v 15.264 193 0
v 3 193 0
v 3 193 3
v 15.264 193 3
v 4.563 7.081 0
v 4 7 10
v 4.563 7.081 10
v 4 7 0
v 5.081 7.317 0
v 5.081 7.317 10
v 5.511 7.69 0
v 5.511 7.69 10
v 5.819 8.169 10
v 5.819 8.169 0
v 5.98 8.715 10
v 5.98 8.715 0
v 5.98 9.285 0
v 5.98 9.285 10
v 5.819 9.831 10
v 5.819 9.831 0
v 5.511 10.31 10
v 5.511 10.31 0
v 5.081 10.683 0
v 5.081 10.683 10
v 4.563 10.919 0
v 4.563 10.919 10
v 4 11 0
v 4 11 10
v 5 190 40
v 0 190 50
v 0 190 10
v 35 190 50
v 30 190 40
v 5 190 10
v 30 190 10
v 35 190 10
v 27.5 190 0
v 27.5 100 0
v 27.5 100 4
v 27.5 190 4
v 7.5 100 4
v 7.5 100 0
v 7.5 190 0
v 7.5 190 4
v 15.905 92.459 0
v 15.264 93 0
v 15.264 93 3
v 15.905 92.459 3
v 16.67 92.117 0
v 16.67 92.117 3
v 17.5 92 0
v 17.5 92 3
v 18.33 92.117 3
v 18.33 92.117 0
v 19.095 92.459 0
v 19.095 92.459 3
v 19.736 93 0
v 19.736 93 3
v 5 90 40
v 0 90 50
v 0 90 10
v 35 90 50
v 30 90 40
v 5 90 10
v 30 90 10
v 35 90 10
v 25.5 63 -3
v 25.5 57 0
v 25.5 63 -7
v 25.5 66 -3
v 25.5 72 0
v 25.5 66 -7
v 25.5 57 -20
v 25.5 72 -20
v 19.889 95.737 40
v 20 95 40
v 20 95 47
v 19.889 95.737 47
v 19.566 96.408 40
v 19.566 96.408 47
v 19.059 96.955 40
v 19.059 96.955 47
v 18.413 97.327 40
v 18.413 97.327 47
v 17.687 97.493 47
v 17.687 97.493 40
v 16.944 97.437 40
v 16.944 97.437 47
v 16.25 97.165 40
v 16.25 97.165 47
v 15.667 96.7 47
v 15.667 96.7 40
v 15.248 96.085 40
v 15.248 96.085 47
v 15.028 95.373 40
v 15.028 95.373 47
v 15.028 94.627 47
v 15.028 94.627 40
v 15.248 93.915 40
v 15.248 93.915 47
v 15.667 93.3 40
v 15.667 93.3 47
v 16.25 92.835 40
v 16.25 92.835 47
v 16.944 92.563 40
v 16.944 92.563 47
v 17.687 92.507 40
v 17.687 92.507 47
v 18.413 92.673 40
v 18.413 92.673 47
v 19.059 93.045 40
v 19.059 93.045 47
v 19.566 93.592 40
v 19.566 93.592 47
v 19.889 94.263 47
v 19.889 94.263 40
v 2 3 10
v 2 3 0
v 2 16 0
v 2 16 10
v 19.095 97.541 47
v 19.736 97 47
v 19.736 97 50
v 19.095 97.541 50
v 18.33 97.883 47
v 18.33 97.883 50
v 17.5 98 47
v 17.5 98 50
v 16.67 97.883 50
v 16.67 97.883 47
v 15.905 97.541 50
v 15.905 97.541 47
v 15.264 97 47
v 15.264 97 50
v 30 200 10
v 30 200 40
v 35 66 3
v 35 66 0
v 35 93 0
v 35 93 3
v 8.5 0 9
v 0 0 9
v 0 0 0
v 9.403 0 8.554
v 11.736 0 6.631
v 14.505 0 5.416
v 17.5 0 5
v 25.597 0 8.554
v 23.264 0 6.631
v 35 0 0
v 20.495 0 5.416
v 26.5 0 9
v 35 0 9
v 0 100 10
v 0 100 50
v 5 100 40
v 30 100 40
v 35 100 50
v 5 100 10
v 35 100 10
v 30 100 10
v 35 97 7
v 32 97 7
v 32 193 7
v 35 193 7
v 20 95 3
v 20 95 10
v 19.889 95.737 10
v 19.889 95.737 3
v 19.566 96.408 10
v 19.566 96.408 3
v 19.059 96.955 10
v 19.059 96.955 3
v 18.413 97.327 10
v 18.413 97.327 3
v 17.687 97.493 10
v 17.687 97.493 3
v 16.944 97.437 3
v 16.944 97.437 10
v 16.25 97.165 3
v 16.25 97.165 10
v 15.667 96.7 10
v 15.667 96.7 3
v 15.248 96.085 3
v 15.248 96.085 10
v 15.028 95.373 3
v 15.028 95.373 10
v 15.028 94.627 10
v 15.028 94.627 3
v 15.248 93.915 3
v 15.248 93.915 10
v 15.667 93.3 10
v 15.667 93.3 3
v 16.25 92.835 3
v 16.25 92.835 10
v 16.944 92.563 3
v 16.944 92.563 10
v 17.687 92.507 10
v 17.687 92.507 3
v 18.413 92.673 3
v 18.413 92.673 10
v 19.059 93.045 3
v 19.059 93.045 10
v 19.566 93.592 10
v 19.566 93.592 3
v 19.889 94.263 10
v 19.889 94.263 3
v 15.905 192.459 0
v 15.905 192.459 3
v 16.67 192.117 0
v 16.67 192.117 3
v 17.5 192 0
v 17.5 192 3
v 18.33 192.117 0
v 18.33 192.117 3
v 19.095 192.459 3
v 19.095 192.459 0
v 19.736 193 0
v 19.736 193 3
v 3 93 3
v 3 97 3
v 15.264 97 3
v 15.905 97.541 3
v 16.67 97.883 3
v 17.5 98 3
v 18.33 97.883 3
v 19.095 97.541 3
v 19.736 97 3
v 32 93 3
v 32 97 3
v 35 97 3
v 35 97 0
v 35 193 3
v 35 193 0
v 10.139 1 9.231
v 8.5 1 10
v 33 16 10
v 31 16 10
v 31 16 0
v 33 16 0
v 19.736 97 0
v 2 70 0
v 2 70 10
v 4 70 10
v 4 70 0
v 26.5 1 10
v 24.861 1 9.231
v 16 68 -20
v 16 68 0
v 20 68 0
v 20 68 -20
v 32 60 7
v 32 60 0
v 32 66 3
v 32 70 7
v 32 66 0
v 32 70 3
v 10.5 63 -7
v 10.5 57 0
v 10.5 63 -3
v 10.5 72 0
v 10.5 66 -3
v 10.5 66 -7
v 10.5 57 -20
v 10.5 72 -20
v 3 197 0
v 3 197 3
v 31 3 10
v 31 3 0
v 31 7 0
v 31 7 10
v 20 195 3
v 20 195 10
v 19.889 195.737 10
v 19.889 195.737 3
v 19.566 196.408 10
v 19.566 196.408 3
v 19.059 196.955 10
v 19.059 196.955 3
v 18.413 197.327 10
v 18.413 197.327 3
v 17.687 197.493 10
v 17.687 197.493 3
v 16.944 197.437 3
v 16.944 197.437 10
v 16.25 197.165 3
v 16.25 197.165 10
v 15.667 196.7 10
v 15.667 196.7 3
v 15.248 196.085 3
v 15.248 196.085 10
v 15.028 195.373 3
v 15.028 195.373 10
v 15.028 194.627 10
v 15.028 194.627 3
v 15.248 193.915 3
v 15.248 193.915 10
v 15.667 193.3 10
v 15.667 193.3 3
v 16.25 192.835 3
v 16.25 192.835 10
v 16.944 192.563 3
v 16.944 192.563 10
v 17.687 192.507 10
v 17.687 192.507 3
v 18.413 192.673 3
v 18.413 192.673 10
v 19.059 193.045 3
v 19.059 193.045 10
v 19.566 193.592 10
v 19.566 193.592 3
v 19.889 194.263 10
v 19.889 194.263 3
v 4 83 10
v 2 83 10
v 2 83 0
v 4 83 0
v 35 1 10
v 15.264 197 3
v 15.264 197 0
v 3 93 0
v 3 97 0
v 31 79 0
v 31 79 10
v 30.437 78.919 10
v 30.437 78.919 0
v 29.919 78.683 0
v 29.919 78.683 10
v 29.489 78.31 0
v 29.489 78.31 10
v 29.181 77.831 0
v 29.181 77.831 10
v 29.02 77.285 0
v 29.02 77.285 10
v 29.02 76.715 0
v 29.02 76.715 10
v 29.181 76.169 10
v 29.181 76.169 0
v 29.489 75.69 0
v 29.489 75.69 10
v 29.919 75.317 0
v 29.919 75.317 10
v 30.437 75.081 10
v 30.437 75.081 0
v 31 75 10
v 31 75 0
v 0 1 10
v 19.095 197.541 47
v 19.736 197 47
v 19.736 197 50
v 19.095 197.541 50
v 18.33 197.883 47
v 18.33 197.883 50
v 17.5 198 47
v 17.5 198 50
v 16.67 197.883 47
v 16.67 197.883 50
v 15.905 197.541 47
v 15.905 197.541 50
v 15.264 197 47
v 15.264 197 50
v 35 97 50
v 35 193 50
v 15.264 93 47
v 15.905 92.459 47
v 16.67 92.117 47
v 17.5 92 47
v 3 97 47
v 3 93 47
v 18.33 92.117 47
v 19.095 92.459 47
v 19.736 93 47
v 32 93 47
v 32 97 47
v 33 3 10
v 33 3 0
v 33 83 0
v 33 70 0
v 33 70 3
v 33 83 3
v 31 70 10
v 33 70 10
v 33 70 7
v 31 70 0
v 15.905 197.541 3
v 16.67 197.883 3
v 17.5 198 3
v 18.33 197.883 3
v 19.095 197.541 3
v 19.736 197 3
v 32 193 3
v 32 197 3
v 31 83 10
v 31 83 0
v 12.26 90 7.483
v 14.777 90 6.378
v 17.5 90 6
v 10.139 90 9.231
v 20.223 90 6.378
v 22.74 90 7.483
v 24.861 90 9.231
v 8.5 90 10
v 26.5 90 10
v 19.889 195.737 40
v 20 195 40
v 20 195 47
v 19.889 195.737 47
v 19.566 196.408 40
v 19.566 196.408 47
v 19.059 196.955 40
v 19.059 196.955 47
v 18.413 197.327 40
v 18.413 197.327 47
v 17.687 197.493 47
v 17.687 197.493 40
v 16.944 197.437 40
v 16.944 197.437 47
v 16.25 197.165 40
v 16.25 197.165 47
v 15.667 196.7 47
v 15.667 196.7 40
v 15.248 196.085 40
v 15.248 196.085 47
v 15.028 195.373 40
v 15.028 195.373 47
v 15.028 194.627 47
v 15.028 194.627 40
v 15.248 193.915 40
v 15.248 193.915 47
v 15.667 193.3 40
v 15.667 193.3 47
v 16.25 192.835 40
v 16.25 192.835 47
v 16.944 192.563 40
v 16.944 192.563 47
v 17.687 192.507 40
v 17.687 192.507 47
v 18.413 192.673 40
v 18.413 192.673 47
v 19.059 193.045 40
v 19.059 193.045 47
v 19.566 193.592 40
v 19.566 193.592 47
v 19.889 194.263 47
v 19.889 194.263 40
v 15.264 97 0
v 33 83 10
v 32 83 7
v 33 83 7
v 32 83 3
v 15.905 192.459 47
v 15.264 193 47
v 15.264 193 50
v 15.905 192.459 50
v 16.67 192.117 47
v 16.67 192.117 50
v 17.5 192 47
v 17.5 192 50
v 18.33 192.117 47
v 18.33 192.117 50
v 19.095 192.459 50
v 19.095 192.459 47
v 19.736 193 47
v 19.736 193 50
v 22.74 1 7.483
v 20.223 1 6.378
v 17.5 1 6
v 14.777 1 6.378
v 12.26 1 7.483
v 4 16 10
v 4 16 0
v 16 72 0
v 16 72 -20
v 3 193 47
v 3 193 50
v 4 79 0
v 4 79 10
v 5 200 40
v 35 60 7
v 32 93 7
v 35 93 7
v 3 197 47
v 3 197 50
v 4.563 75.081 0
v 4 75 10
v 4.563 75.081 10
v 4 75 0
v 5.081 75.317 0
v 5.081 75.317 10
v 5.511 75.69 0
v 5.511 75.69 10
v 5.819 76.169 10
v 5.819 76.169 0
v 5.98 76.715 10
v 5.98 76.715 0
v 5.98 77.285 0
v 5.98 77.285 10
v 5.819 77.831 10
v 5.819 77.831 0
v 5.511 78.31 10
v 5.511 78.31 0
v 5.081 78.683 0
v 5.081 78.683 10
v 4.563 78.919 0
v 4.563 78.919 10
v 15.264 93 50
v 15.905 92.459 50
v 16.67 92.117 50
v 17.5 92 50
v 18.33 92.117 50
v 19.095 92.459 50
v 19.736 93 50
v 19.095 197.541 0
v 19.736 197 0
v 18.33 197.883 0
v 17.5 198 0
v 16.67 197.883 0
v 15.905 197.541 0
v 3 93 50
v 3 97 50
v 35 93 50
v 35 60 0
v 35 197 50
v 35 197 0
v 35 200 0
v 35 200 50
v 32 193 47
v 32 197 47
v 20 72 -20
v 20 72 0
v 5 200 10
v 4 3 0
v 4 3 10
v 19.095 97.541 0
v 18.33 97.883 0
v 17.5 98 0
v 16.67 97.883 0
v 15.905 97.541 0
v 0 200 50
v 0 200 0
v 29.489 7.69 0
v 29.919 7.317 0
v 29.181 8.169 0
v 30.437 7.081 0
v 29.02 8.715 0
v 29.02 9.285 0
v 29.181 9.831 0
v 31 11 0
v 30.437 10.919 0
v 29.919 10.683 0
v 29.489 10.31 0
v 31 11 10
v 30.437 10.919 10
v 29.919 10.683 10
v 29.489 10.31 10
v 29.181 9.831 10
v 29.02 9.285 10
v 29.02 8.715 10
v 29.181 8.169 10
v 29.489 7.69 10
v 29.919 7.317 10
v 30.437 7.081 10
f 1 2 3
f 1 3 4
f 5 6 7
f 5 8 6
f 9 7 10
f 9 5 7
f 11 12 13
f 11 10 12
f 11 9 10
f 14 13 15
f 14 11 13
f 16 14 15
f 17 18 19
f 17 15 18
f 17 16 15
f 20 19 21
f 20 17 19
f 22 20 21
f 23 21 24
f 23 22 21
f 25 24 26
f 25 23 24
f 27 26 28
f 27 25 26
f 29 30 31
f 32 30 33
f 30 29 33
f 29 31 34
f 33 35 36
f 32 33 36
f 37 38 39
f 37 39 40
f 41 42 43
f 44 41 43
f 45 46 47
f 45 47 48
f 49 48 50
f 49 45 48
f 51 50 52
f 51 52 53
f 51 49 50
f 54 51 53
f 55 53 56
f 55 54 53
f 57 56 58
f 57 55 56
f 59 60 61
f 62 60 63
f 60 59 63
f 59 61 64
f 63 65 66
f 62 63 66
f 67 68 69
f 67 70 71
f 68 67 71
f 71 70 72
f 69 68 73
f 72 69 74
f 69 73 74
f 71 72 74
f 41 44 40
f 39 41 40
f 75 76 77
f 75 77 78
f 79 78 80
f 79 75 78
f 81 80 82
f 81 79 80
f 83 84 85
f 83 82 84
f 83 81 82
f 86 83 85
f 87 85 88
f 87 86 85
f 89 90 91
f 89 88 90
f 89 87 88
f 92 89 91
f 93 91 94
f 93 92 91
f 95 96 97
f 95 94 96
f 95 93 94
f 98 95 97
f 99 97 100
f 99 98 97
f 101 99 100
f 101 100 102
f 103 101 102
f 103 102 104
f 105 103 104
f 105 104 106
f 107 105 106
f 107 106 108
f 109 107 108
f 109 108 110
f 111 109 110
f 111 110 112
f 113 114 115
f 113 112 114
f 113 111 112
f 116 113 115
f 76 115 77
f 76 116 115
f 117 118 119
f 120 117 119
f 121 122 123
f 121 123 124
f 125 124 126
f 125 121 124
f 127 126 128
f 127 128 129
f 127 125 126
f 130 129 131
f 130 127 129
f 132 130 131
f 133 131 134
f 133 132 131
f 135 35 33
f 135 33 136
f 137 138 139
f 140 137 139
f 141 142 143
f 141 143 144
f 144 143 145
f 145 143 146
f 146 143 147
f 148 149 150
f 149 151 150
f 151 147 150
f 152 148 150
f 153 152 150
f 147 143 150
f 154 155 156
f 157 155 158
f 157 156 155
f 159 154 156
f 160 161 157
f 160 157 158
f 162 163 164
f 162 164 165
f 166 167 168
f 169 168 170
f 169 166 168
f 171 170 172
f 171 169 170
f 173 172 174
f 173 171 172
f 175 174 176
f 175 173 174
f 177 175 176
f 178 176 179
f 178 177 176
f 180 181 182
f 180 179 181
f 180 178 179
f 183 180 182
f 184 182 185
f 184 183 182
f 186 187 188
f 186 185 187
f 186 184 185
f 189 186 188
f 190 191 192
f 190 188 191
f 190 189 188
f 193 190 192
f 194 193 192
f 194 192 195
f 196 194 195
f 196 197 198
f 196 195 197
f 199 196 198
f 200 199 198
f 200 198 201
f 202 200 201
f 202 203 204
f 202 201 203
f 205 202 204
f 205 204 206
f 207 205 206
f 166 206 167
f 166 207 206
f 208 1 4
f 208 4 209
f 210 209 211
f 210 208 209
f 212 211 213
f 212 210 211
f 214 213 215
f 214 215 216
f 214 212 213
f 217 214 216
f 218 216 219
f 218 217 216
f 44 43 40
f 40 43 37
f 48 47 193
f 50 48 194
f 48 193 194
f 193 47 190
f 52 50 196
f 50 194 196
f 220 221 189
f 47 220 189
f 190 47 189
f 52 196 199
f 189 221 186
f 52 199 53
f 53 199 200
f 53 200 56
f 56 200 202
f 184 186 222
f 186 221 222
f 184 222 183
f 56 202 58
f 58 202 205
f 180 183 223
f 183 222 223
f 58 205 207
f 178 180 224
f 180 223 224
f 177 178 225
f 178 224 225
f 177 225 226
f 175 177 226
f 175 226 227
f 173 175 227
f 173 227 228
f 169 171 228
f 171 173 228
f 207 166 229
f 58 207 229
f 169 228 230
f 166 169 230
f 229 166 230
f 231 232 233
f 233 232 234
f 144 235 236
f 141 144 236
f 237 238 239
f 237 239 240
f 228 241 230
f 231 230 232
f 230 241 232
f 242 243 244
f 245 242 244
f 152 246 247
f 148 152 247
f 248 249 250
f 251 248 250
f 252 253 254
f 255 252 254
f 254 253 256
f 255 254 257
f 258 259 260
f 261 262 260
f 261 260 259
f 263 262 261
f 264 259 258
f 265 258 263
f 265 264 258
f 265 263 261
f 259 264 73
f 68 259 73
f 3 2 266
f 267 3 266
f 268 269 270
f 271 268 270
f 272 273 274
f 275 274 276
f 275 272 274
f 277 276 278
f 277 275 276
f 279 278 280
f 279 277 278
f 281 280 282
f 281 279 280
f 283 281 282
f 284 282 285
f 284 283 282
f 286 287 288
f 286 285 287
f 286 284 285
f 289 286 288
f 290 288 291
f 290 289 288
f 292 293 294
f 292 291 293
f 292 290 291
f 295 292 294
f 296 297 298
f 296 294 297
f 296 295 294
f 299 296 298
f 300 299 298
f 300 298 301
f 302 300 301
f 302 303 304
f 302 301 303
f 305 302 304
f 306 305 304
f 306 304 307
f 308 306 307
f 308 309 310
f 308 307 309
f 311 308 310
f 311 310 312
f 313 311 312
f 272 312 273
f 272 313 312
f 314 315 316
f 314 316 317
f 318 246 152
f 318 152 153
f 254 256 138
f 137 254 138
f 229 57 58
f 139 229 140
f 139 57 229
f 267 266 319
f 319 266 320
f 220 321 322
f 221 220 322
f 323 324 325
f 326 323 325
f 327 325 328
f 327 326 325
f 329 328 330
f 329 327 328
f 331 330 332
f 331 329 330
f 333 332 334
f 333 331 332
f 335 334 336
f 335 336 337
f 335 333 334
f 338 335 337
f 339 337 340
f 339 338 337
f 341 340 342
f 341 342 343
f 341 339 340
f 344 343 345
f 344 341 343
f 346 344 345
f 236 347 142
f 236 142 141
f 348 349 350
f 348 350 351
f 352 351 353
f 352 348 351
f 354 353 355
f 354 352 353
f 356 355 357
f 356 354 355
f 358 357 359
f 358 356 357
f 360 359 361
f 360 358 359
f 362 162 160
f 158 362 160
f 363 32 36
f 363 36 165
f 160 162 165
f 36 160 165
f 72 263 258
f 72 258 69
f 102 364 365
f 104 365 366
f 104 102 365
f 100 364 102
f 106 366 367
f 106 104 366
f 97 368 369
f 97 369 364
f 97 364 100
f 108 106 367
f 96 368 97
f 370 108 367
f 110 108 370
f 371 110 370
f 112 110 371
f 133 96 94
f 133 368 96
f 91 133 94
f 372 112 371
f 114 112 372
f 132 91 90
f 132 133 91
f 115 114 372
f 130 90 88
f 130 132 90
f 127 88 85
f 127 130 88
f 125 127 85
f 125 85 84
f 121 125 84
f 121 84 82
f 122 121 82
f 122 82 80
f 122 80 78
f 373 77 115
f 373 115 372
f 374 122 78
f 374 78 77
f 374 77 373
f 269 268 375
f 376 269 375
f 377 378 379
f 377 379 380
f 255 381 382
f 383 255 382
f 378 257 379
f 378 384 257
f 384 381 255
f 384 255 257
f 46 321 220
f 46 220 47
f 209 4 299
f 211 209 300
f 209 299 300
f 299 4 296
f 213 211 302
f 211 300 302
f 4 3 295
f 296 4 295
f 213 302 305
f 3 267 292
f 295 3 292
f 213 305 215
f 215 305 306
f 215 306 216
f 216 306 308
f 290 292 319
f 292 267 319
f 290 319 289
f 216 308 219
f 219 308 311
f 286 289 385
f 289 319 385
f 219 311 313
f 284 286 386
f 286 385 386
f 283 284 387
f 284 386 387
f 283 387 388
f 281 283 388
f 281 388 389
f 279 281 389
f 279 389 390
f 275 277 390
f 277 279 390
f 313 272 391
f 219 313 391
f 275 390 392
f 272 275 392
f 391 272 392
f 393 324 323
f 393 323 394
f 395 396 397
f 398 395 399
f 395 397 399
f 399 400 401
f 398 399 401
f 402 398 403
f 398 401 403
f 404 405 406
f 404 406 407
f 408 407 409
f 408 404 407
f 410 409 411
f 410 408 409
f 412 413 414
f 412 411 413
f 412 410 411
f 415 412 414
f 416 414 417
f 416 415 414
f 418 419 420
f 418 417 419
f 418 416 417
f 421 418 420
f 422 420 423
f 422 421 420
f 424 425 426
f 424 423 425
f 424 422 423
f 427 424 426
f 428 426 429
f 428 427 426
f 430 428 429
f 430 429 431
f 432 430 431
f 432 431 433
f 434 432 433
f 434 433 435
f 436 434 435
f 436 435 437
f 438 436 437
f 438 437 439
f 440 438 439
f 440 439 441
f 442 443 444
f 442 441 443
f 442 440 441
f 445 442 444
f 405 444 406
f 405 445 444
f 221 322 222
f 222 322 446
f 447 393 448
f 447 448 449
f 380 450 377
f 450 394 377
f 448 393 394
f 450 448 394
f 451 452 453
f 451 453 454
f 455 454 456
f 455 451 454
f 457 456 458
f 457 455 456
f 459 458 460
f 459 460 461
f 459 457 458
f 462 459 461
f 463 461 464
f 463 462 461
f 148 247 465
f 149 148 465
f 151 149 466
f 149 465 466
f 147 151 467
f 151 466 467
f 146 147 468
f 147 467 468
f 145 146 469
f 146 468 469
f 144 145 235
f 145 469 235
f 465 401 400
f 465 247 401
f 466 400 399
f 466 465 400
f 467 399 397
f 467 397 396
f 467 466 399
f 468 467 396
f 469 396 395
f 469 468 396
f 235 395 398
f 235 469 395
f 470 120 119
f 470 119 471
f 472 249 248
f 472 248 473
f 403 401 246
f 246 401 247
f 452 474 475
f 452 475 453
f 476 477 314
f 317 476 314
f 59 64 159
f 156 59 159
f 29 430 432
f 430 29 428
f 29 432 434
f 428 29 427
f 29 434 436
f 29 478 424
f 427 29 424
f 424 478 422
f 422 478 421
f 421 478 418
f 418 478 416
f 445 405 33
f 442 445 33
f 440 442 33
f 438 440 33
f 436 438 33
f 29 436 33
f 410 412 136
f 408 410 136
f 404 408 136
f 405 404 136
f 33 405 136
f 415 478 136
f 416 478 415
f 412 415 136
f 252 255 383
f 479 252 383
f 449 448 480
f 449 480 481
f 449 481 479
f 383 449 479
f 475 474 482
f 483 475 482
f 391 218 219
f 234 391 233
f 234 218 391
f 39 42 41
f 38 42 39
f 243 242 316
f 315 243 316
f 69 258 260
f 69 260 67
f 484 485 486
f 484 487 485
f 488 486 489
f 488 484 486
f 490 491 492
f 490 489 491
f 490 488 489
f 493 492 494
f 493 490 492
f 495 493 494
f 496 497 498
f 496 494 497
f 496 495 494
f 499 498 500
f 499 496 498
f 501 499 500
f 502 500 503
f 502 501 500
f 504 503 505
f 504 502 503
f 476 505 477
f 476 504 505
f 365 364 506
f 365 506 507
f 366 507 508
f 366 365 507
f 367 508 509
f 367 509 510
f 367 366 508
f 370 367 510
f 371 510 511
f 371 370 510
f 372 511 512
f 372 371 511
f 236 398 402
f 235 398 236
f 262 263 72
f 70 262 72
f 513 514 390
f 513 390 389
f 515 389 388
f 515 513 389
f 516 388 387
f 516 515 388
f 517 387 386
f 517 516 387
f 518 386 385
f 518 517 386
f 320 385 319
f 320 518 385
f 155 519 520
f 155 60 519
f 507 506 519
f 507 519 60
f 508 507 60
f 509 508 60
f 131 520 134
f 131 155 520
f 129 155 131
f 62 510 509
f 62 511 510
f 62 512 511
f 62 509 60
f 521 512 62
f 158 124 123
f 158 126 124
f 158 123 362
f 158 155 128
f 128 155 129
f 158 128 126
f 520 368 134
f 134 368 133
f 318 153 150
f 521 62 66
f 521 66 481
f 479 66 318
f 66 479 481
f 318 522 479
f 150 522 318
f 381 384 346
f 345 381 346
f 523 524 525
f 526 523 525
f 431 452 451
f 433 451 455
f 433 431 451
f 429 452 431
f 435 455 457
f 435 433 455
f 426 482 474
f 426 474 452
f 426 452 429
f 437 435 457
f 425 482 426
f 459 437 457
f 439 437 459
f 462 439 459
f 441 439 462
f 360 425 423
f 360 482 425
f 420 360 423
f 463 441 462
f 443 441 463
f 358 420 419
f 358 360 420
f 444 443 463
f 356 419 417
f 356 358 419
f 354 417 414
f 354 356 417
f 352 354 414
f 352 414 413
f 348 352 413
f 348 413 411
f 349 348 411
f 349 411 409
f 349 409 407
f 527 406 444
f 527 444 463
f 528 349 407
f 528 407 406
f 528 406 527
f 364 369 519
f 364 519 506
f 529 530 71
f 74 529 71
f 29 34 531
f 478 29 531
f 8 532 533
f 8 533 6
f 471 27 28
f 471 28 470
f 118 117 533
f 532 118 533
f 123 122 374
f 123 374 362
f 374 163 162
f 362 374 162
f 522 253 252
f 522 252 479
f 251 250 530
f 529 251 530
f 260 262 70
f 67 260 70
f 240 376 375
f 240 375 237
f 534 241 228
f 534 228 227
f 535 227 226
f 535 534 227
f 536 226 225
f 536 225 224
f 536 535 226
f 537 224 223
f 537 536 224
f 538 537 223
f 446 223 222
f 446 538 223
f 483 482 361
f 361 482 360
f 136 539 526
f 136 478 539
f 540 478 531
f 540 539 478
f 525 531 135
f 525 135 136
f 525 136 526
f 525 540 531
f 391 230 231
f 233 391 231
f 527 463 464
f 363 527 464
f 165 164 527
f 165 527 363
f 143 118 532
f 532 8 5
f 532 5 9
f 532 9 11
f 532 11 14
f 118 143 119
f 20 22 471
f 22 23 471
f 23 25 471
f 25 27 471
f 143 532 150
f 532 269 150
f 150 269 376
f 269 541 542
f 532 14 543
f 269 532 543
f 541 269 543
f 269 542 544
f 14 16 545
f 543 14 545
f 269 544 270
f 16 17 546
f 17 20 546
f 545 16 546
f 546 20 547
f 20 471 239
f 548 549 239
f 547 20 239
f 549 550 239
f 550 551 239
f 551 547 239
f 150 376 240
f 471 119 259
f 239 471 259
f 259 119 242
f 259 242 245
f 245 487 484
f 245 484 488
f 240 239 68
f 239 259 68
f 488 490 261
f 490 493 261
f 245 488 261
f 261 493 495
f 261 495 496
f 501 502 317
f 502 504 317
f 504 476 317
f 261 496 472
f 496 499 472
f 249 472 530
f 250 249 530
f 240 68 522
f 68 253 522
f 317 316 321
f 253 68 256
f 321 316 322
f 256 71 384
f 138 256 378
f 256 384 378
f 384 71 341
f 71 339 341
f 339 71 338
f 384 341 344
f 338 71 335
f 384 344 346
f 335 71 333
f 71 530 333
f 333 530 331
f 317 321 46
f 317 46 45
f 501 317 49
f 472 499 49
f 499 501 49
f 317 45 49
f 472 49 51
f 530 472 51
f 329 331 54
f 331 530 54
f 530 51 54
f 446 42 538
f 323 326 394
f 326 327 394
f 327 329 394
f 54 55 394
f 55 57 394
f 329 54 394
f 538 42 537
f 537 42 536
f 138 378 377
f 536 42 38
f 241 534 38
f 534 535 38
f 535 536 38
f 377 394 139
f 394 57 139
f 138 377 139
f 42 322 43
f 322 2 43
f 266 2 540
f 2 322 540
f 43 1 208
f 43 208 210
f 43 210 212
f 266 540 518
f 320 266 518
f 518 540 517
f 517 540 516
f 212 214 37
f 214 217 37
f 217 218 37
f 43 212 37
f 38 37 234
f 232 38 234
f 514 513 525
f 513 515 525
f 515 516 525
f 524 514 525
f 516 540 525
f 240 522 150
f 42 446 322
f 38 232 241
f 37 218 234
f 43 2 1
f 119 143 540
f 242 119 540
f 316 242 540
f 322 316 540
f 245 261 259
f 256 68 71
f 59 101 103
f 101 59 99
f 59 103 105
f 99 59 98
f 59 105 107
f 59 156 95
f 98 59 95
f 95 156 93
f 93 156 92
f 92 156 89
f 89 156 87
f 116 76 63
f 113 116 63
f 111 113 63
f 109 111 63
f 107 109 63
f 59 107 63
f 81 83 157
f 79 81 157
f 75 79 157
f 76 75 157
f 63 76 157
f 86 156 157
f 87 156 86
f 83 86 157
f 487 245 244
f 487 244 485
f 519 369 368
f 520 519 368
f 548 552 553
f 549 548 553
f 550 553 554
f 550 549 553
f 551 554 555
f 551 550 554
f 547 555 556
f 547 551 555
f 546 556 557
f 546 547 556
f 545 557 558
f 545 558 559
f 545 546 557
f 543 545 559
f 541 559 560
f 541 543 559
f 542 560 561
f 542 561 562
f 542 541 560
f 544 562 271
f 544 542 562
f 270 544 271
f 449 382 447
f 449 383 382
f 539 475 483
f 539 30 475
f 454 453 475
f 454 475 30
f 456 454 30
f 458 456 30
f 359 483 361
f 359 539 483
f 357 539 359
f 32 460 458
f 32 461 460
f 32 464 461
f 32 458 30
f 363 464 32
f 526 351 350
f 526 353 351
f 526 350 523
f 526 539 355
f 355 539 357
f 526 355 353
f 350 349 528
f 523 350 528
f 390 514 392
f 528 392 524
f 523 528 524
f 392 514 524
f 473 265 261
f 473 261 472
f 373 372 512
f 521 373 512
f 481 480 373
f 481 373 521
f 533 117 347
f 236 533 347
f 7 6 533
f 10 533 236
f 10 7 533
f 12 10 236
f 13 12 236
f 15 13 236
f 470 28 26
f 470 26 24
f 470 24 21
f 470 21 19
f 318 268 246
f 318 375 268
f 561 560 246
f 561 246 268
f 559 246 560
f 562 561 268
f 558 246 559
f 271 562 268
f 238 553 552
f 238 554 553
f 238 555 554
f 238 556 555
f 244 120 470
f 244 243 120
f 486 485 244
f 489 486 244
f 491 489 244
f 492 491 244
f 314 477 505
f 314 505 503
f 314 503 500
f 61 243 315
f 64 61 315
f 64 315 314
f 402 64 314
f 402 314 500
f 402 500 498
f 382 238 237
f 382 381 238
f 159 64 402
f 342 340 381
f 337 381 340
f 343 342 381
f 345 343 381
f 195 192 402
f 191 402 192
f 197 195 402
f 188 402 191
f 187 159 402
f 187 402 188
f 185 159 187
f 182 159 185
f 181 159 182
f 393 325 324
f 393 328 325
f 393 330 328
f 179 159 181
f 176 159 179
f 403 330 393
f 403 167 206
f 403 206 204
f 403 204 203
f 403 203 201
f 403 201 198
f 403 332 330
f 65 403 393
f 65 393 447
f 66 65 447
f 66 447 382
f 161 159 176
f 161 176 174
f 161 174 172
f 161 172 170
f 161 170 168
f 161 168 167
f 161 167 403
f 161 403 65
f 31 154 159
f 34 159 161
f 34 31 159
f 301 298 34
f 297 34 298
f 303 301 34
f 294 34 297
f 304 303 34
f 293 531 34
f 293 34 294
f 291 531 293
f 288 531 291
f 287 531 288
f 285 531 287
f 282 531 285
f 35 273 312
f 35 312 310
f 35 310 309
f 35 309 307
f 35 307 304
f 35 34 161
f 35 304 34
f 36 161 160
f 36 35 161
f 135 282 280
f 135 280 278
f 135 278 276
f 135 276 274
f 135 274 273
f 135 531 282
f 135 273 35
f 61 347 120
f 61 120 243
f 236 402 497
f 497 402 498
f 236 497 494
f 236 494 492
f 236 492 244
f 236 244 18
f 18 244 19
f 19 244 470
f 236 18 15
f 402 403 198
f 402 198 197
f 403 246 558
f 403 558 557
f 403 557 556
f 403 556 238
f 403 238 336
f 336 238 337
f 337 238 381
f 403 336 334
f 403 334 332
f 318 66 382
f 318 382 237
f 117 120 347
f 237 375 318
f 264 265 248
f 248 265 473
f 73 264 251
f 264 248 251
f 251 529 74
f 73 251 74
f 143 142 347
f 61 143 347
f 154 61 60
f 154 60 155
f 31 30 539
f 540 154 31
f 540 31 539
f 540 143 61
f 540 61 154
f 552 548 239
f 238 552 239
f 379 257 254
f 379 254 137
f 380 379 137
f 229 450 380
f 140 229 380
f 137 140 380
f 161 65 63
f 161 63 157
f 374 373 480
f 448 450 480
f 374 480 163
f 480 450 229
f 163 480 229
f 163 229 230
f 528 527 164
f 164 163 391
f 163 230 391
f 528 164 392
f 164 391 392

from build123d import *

# Parameters (mm, degrees)
CYLINDER005_R     = 3
CYLINDER005_DEPTH = 3
CYLINDER006_R     = 3
CYLINDER006_DEPTH = 3
CYLINDER002_R     = 2.5
CYLINDER002_DEPTH = 60
BOX010_W          = 30
BOX010_H          = 4
BOX010_DEPTH      = 3
BOX008_W          = 30
BOX008_H          = 4
BOX008_DEPTH      = 3
BOX006_W          = 3
BOX006_H          = 4
BOX006_DEPTH      = 50
BOX004_W          = 3
BOX004_H          = 136
BOX004_DEPTH      = 4
BOX003_W          = 25
BOX003_H          = 220
BOX003_DEPTH      = 30
BOX002_W          = 35
BOX002_H          = 10
BOX002_DEPTH      = 50
BOX021_W          = 3
BOX021_H          = 6
BOX021_DEPTH      = 4
BOX018_W          = 20
BOX018_H          = 90
BOX018_DEPTH      = 4
CYLINDER008_R     = 2
CYLINDER008_DEPTH = 10
CYLINDER009_R     = 2
CYLINDER009_DEPTH = 10
CYLINDER010_R     = 2
CYLINDER010_DEPTH = 10
CYLINDER007_R     = 2
CYLINDER007_DEPTH = 10
BOX015_W          = 2
BOX015_H          = 13
BOX015_DEPTH      = 10
BOX016_W          = 2
BOX016_H          = 13
BOX016_DEPTH      = 10
BOX017_W          = 2
BOX017_H          = 13
BOX017_DEPTH      = 10
BOX014_W          = 2
BOX014_H          = 13
BOX014_DEPTH      = 10
CYLINDER003_R     = 3
CYLINDER003_DEPTH = 3
CYLINDER001_R     = 2.5
CYLINDER001_DEPTH = 60
BOX007_W          = 30
BOX007_H          = 4
BOX007_DEPTH      = 3
BOX005_W          = 3
BOX005_H          = 4
BOX005_DEPTH      = 50
CYLINDER_R        = 10
CYLINDER_DEPTH    = 90
BOX_W             = 35
BOX_H             = 200
BOX_DEPTH         = 10
CHAMFER_SIZE      = 1
BOX023_W          = 4
BOX023_H          = 4
BOX023_DEPTH      = 20
BOX022_W          = 20
BOX022_H          = 3
BOX022_DEPTH      = 4
BOX019_W          = 15
BOX019_H          = 15
BOX019_DEPTH      = 20
CYLINDER004_R     = 3
CYLINDER004_DEPTH = 3
BOX009_W          = 30
BOX009_H          = 4
BOX009_DEPTH      = 3
BOX001_W          = 35
BOX001_H          = 10
BOX001_DEPTH      = 50


with BuildPart() as cilindro005:
    # Cylinder005 → Cylinder005 (new body)
    with BuildSketch(Plane(origin=(17.5, 195, 0), x_dir=(1, 0, 0), z_dir=(0, 0, 1))):
        Circle(CYLINDER005_R)
    extrude(amount=CYLINDER005_DEPTH)


with BuildPart() as cilindro006:
    # Cylinder006 → Cylinder006 (new body)
    with BuildSketch(Plane(origin=(17.5, 195, 47), x_dir=(1, 0, 0), z_dir=(0, 0, 1))):
        Circle(CYLINDER006_R)
    extrude(amount=CYLINDER006_DEPTH)


with BuildPart() as cilindro002:
    # Cylinder002 → Cylinder002 (new body)
    with BuildSketch(Plane(origin=(17.5, 195, -1), x_dir=(1, 0, 0), z_dir=(0, 0, 1))):
        Circle(CYLINDER002_R)
    extrude(amount=CYLINDER002_DEPTH)


with BuildPart() as cubo010:
    # Box010 → Box010 (new body)
    with BuildSketch(Plane(origin=(3, 193, 47), x_dir=(1, 0, 0), z_dir=(0, 0, 1))):
        with Locations((15, 2)):
            Rectangle(BOX010_W, BOX010_H)
    extrude(amount=BOX010_DEPTH)


with BuildPart() as cubo008:
    # Box008 → Box008 (new body)
    with BuildSketch(Plane(origin=(3, 193, 0), x_dir=(1, 0, 0), z_dir=(0, 0, 1))):
        with Locations((15, 2)):
            Rectangle(BOX008_W, BOX008_H)
    extrude(amount=BOX008_DEPTH)


with BuildPart() as cubo006:
    # Box006 → Box006 (new body)
    with BuildSketch(Plane(origin=(32, 193, 0), x_dir=(1, 0, 0), z_dir=(0, 0, 1))):
        with Locations((1.5, 2)):
            Rectangle(BOX006_W, BOX006_H)
    extrude(amount=BOX006_DEPTH)


with BuildPart() as cubo004:
    # Box004 → Box004 (new body)
    with BuildSketch(Plane(origin=(32, 60, 3), x_dir=(1, 0, 0), z_dir=(0, 0, 1))):
        with Locations((1.5, 68)):
            Rectangle(BOX004_W, BOX004_H)
    extrude(amount=BOX004_DEPTH)


with BuildPart() as cubo003:
    # Box003 → Box003 (new body)
    with BuildSketch(Plane(origin=(5, 0, 10), x_dir=(1, 0, 0), z_dir=(0, 0, 1))):
        with Locations((12.5, 110)):
            Rectangle(BOX003_W, BOX003_H)
    extrude(amount=BOX003_DEPTH)


with BuildPart() as cut023:
    # Box002 → Box002 (new body)
    with BuildSketch(Plane(origin=(0, 190, 0), x_dir=(1, 0, 0), z_dir=(0, 0, 1))):
        with Locations((17.5, 5)):
            Rectangle(BOX002_W, BOX002_H)
    extrude(amount=BOX002_DEPTH)

    # Cut002: cut Cubo003
    add(cubo003.part, mode=Mode.SUBTRACT)

    # Cut005: cut Cubo004
    add(cubo004.part, mode=Mode.SUBTRACT)

    # Cut007: cut Cubo006
    add(cubo006.part, mode=Mode.SUBTRACT)

    # Cut011: cut Cubo008
    add(cubo008.part, mode=Mode.SUBTRACT)

    # Cut015: cut Cubo010
    add(cubo010.part, mode=Mode.SUBTRACT)

    # Cut017: cut Cilindro002
    add(cilindro002.part, mode=Mode.SUBTRACT)

    # Cut021: cut Cilindro006
    add(cilindro006.part, mode=Mode.SUBTRACT)

    # Cut023: cut Cilindro005
    add(cilindro005.part, mode=Mode.SUBTRACT)


with BuildPart() as cubo021:
    # Box021 → Box021 (new body)
    with BuildSketch(Plane(origin=(32, 60, 0), x_dir=(1, 0, 0), z_dir=(0, 0, 1))):
        with Locations((1.5, 3)):
            Rectangle(BOX021_W, BOX021_H)
    extrude(amount=BOX021_DEPTH)


with BuildPart() as cubo018:
    # Box018 → Box018 (new body)
    with BuildSketch(Plane(origin=(7.5, 100, 0), x_dir=(1, 0, 0), z_dir=(0, 0, 1))):
        with Locations((10, 45)):
            Rectangle(BOX018_W, BOX018_H)
    extrude(amount=BOX018_DEPTH)


with BuildPart() as cilindro008:
    # Cylinder008 → Cylinder008 (new body)
    with BuildSketch(Plane(origin=(31, 9, 0), x_dir=(1, 0, 0), z_dir=(0, 0, 1))):
        Circle(CYLINDER008_R)
    extrude(amount=CYLINDER008_DEPTH)


with BuildPart() as cilindro009:
    # Cylinder009 → Cylinder009 (new body)
    with BuildSketch(Plane(origin=(31, 77, 0), x_dir=(1, 0, 0), z_dir=(0, 0, 1))):
        Circle(CYLINDER009_R)
    extrude(amount=CYLINDER009_DEPTH)


with BuildPart() as cilindro010:
    # Cylinder010 → Cylinder010 (new body)
    with BuildSketch(Plane(origin=(4, 77, 0), x_dir=(1, 0, 0), z_dir=(0, 0, 1))):
        Circle(CYLINDER010_R)
    extrude(amount=CYLINDER010_DEPTH)


with BuildPart() as cilindro007:
    # Cylinder007 → Cylinder007 (new body)
    with BuildSketch(Plane(origin=(4, 9, 0), x_dir=(1, 0, 0), z_dir=(0, 0, 1))):
        Circle(CYLINDER007_R)
    extrude(amount=CYLINDER007_DEPTH)


with BuildPart() as cubo015:
    # Box015 → Box015 (new body)
    with BuildSketch(Plane(origin=(31, 3, 0), x_dir=(1, 0, 0), z_dir=(0, 0, 1))):
        with Locations((1, 6.5)):
            Rectangle(BOX015_W, BOX015_H)
    extrude(amount=BOX015_DEPTH)


with BuildPart() as cubo016:
    # Box016 → Box016 (new body)
    with BuildSketch(Plane(origin=(2, 70, 0), x_dir=(1, 0, 0), z_dir=(0, 0, 1))):
        with Locations((1, 6.5)):
            Rectangle(BOX016_W, BOX016_H)
    extrude(amount=BOX016_DEPTH)


with BuildPart() as cubo017:
    # Box017 → Box017 (new body)
    with BuildSketch(Plane(origin=(31, 70, 0), x_dir=(1, 0, 0), z_dir=(0, 0, 1))):
        with Locations((1, 6.5)):
            Rectangle(BOX017_W, BOX017_H)
    extrude(amount=BOX017_DEPTH)


with BuildPart() as cubo014:
    # Box014 → Box014 (new body)
    with BuildSketch(Plane(origin=(2, 3, 0), x_dir=(1, 0, 0), z_dir=(0, 0, 1))):
        with Locations((1, 6.5)):
            Rectangle(BOX014_W, BOX014_H)
    extrude(amount=BOX014_DEPTH)


with BuildPart() as cilindro003:
    # Cylinder003 → Cylinder003 (new body)
    with BuildSketch(Plane(origin=(17.5, 95, 0), x_dir=(1, 0, 0), z_dir=(0, 0, 1))):
        Circle(CYLINDER003_R)
    extrude(amount=CYLINDER003_DEPTH)


with BuildPart() as cilindro001:
    # Cylinder001 → Cylinder001 (new body)
    with BuildSketch(Plane(origin=(17.5, 95, -1), x_dir=(1, 0, 0), z_dir=(0, 0, 1))):
        Circle(CYLINDER001_R)
    extrude(amount=CYLINDER001_DEPTH)


with BuildPart() as cubo007:
    # Box007 → Box007 (new body)
    with BuildSketch(Plane(origin=(3, 93, 0), x_dir=(1, 0, 0), z_dir=(0, 0, 1))):
        with Locations((15, 2)):
            Rectangle(BOX007_W, BOX007_H)
    extrude(amount=BOX007_DEPTH)


with BuildPart() as cubo005:
    # Box005 → Box005 (new body)
    with BuildSketch(Plane(origin=(32, 93, 0), x_dir=(1, 0, 0), z_dir=(0, 0, 1))):
        with Locations((1.5, 2)):
            Rectangle(BOX005_W, BOX005_H)
    extrude(amount=BOX005_DEPTH)


with BuildPart() as cilindro:
    # Cylinder → Cylinder (new body)
    with BuildSketch(Plane(origin=(17.5, 0, 16), x_dir=(1, 0, 0), z_dir=(0, 1, 0))):
        Circle(CYLINDER_R)
    extrude(amount=CYLINDER_DEPTH)


with BuildPart() as cut037:
    # Box → Box (new body)
    with BuildSketch(Plane.XY):
        with Locations((17.5, 100)):
            Rectangle(BOX_W, BOX_H)
    extrude(amount=BOX_DEPTH)

    # Cut: cut Cilindro
    add(cilindro.part, mode=Mode.SUBTRACT)

    # Chamfer
    chamfer_edges = [cut037.edges().sort_by_distance(p)[0] for p in [
        (30.25, 0, 10),
        (17.5, 0, 6),
        (4.75, 0, 10),
        (25.5, 45, 10),
        (9.5, 45, 10),
    ]]
    chamfer(chamfer_edges, length=CHAMFER_SIZE)

    # Cut003: cut Cubo004
    add(cubo004.part, mode=Mode.SUBTRACT)

    # Cut008: cut Cubo005
    add(cubo005.part, mode=Mode.SUBTRACT)

    # Cut009: cut Cubo006
    add(cubo006.part, mode=Mode.SUBTRACT)

    # Cut012: cut Cubo007
    add(cubo007.part, mode=Mode.SUBTRACT)

    # Cut013: cut Cubo008
    add(cubo008.part, mode=Mode.SUBTRACT)

    # Cut018: cut Cilindro001
    add(cilindro001.part, mode=Mode.SUBTRACT)

    # Cut019: cut Cilindro002
    add(cilindro002.part, mode=Mode.SUBTRACT)

    # Cut024: cut Cilindro003
    add(cilindro003.part, mode=Mode.SUBTRACT)

    # Cut025: cut Cilindro005
    add(cilindro005.part, mode=Mode.SUBTRACT)

    # Cut028: cut Cubo014
    add(cubo014.part, mode=Mode.SUBTRACT)

    # Cut029: cut Cubo017
    add(cubo017.part, mode=Mode.SUBTRACT)

    # Cut030: cut Cubo016
    add(cubo016.part, mode=Mode.SUBTRACT)

    # Cut031: cut Cubo015
    add(cubo015.part, mode=Mode.SUBTRACT)

    # Cut032: cut Cilindro007
    add(cilindro007.part, mode=Mode.SUBTRACT)

    # Cut033: cut Cilindro010
    add(cilindro010.part, mode=Mode.SUBTRACT)

    # Cut034: cut Cilindro009
    add(cilindro009.part, mode=Mode.SUBTRACT)

    # Cut035: cut Cilindro008
    add(cilindro008.part, mode=Mode.SUBTRACT)

    # Cut036: cut Cubo018
    add(cubo018.part, mode=Mode.SUBTRACT)

    # Cut037: cut Cubo021
    add(cubo021.part, mode=Mode.SUBTRACT)


with BuildPart() as cubo023:
    # Box023 → Box023 (new body)
    with BuildSketch(Plane(origin=(16, 61, -20), x_dir=(1, 0, 0), z_dir=(0, 0, 1))):
        with Locations((2, 2)):
            Rectangle(BOX023_W, BOX023_H)
    extrude(amount=BOX023_DEPTH)


with BuildPart() as cubo022:
    # Box022 → Box022 (new body)
    with BuildSketch(Plane(origin=(8, 56, -7), x_dir=(1, 0, 0), z_dir=(0, 0, 1))):
        with Locations((10, 1.5)):
            Rectangle(BOX022_W, BOX022_H)
    extrude(amount=BOX022_DEPTH)


with BuildPart() as cut039:
    # Box019 → Box019 (new body)
    with BuildSketch(Plane(origin=(10.5, 50, -20), x_dir=(1, 0, 0), z_dir=(0, 0, 1))):
        with Locations((7.5, 7.5)):
            Rectangle(BOX019_W, BOX019_H)
    extrude(amount=BOX019_DEPTH)

    # Cut038: cut Cubo022
    add(cubo022.part, mode=Mode.SUBTRACT)

    # Cut039: cut Cubo023
    add(cubo023.part, mode=Mode.SUBTRACT)


with BuildPart() as cut039_1:
    # Cut039 placement: moved
    add(cut039.part.moved(Location((0, 7, 0))))


with BuildPart() as cilindro004:
    # Cylinder004 → Cylinder004 (new body)
    with BuildSketch(Plane(origin=(17.5, 95, 47), x_dir=(1, 0, 0), z_dir=(0, 0, 1))):
        Circle(CYLINDER004_R)
    extrude(amount=CYLINDER004_DEPTH)


with BuildPart() as cubo009:
    # Box009 → Box009 (new body)
    with BuildSketch(Plane(origin=(3, 93, 47), x_dir=(1, 0, 0), z_dir=(0, 0, 1))):
        with Locations((15, 2)):
            Rectangle(BOX009_W, BOX009_H)
    extrude(amount=BOX009_DEPTH)


with BuildPart() as fusion:
    # Box001 → Box001 (new body)
    with BuildSketch(Plane(origin=(0, 90, 0), x_dir=(1, 0, 0), z_dir=(0, 0, 1))):
        with Locations((17.5, 5)):
            Rectangle(BOX001_W, BOX001_H)
    extrude(amount=BOX001_DEPTH)

    # Cut001: cut Cubo003
    add(cubo003.part, mode=Mode.SUBTRACT)

    # Cut004: cut Cubo004
    add(cubo004.part, mode=Mode.SUBTRACT)

    # Cut006: cut Cubo005
    add(cubo005.part, mode=Mode.SUBTRACT)

    # Cut010: cut Cubo007
    add(cubo007.part, mode=Mode.SUBTRACT)

    # Cut014: cut Cubo009
    add(cubo009.part, mode=Mode.SUBTRACT)

    # Cut016: cut Cilindro001
    add(cilindro001.part, mode=Mode.SUBTRACT)

    # Cut020: cut Cilindro004
    add(cilindro004.part, mode=Mode.SUBTRACT)

    # Cut022: cut Cilindro003
    add(cilindro003.part, mode=Mode.SUBTRACT)

    # Fusion: union Cut023, Cut037, Cut039
    add(cut023.part)
    add(cut037.part)
    add(cut039_1.part)


solid = fusion.part
